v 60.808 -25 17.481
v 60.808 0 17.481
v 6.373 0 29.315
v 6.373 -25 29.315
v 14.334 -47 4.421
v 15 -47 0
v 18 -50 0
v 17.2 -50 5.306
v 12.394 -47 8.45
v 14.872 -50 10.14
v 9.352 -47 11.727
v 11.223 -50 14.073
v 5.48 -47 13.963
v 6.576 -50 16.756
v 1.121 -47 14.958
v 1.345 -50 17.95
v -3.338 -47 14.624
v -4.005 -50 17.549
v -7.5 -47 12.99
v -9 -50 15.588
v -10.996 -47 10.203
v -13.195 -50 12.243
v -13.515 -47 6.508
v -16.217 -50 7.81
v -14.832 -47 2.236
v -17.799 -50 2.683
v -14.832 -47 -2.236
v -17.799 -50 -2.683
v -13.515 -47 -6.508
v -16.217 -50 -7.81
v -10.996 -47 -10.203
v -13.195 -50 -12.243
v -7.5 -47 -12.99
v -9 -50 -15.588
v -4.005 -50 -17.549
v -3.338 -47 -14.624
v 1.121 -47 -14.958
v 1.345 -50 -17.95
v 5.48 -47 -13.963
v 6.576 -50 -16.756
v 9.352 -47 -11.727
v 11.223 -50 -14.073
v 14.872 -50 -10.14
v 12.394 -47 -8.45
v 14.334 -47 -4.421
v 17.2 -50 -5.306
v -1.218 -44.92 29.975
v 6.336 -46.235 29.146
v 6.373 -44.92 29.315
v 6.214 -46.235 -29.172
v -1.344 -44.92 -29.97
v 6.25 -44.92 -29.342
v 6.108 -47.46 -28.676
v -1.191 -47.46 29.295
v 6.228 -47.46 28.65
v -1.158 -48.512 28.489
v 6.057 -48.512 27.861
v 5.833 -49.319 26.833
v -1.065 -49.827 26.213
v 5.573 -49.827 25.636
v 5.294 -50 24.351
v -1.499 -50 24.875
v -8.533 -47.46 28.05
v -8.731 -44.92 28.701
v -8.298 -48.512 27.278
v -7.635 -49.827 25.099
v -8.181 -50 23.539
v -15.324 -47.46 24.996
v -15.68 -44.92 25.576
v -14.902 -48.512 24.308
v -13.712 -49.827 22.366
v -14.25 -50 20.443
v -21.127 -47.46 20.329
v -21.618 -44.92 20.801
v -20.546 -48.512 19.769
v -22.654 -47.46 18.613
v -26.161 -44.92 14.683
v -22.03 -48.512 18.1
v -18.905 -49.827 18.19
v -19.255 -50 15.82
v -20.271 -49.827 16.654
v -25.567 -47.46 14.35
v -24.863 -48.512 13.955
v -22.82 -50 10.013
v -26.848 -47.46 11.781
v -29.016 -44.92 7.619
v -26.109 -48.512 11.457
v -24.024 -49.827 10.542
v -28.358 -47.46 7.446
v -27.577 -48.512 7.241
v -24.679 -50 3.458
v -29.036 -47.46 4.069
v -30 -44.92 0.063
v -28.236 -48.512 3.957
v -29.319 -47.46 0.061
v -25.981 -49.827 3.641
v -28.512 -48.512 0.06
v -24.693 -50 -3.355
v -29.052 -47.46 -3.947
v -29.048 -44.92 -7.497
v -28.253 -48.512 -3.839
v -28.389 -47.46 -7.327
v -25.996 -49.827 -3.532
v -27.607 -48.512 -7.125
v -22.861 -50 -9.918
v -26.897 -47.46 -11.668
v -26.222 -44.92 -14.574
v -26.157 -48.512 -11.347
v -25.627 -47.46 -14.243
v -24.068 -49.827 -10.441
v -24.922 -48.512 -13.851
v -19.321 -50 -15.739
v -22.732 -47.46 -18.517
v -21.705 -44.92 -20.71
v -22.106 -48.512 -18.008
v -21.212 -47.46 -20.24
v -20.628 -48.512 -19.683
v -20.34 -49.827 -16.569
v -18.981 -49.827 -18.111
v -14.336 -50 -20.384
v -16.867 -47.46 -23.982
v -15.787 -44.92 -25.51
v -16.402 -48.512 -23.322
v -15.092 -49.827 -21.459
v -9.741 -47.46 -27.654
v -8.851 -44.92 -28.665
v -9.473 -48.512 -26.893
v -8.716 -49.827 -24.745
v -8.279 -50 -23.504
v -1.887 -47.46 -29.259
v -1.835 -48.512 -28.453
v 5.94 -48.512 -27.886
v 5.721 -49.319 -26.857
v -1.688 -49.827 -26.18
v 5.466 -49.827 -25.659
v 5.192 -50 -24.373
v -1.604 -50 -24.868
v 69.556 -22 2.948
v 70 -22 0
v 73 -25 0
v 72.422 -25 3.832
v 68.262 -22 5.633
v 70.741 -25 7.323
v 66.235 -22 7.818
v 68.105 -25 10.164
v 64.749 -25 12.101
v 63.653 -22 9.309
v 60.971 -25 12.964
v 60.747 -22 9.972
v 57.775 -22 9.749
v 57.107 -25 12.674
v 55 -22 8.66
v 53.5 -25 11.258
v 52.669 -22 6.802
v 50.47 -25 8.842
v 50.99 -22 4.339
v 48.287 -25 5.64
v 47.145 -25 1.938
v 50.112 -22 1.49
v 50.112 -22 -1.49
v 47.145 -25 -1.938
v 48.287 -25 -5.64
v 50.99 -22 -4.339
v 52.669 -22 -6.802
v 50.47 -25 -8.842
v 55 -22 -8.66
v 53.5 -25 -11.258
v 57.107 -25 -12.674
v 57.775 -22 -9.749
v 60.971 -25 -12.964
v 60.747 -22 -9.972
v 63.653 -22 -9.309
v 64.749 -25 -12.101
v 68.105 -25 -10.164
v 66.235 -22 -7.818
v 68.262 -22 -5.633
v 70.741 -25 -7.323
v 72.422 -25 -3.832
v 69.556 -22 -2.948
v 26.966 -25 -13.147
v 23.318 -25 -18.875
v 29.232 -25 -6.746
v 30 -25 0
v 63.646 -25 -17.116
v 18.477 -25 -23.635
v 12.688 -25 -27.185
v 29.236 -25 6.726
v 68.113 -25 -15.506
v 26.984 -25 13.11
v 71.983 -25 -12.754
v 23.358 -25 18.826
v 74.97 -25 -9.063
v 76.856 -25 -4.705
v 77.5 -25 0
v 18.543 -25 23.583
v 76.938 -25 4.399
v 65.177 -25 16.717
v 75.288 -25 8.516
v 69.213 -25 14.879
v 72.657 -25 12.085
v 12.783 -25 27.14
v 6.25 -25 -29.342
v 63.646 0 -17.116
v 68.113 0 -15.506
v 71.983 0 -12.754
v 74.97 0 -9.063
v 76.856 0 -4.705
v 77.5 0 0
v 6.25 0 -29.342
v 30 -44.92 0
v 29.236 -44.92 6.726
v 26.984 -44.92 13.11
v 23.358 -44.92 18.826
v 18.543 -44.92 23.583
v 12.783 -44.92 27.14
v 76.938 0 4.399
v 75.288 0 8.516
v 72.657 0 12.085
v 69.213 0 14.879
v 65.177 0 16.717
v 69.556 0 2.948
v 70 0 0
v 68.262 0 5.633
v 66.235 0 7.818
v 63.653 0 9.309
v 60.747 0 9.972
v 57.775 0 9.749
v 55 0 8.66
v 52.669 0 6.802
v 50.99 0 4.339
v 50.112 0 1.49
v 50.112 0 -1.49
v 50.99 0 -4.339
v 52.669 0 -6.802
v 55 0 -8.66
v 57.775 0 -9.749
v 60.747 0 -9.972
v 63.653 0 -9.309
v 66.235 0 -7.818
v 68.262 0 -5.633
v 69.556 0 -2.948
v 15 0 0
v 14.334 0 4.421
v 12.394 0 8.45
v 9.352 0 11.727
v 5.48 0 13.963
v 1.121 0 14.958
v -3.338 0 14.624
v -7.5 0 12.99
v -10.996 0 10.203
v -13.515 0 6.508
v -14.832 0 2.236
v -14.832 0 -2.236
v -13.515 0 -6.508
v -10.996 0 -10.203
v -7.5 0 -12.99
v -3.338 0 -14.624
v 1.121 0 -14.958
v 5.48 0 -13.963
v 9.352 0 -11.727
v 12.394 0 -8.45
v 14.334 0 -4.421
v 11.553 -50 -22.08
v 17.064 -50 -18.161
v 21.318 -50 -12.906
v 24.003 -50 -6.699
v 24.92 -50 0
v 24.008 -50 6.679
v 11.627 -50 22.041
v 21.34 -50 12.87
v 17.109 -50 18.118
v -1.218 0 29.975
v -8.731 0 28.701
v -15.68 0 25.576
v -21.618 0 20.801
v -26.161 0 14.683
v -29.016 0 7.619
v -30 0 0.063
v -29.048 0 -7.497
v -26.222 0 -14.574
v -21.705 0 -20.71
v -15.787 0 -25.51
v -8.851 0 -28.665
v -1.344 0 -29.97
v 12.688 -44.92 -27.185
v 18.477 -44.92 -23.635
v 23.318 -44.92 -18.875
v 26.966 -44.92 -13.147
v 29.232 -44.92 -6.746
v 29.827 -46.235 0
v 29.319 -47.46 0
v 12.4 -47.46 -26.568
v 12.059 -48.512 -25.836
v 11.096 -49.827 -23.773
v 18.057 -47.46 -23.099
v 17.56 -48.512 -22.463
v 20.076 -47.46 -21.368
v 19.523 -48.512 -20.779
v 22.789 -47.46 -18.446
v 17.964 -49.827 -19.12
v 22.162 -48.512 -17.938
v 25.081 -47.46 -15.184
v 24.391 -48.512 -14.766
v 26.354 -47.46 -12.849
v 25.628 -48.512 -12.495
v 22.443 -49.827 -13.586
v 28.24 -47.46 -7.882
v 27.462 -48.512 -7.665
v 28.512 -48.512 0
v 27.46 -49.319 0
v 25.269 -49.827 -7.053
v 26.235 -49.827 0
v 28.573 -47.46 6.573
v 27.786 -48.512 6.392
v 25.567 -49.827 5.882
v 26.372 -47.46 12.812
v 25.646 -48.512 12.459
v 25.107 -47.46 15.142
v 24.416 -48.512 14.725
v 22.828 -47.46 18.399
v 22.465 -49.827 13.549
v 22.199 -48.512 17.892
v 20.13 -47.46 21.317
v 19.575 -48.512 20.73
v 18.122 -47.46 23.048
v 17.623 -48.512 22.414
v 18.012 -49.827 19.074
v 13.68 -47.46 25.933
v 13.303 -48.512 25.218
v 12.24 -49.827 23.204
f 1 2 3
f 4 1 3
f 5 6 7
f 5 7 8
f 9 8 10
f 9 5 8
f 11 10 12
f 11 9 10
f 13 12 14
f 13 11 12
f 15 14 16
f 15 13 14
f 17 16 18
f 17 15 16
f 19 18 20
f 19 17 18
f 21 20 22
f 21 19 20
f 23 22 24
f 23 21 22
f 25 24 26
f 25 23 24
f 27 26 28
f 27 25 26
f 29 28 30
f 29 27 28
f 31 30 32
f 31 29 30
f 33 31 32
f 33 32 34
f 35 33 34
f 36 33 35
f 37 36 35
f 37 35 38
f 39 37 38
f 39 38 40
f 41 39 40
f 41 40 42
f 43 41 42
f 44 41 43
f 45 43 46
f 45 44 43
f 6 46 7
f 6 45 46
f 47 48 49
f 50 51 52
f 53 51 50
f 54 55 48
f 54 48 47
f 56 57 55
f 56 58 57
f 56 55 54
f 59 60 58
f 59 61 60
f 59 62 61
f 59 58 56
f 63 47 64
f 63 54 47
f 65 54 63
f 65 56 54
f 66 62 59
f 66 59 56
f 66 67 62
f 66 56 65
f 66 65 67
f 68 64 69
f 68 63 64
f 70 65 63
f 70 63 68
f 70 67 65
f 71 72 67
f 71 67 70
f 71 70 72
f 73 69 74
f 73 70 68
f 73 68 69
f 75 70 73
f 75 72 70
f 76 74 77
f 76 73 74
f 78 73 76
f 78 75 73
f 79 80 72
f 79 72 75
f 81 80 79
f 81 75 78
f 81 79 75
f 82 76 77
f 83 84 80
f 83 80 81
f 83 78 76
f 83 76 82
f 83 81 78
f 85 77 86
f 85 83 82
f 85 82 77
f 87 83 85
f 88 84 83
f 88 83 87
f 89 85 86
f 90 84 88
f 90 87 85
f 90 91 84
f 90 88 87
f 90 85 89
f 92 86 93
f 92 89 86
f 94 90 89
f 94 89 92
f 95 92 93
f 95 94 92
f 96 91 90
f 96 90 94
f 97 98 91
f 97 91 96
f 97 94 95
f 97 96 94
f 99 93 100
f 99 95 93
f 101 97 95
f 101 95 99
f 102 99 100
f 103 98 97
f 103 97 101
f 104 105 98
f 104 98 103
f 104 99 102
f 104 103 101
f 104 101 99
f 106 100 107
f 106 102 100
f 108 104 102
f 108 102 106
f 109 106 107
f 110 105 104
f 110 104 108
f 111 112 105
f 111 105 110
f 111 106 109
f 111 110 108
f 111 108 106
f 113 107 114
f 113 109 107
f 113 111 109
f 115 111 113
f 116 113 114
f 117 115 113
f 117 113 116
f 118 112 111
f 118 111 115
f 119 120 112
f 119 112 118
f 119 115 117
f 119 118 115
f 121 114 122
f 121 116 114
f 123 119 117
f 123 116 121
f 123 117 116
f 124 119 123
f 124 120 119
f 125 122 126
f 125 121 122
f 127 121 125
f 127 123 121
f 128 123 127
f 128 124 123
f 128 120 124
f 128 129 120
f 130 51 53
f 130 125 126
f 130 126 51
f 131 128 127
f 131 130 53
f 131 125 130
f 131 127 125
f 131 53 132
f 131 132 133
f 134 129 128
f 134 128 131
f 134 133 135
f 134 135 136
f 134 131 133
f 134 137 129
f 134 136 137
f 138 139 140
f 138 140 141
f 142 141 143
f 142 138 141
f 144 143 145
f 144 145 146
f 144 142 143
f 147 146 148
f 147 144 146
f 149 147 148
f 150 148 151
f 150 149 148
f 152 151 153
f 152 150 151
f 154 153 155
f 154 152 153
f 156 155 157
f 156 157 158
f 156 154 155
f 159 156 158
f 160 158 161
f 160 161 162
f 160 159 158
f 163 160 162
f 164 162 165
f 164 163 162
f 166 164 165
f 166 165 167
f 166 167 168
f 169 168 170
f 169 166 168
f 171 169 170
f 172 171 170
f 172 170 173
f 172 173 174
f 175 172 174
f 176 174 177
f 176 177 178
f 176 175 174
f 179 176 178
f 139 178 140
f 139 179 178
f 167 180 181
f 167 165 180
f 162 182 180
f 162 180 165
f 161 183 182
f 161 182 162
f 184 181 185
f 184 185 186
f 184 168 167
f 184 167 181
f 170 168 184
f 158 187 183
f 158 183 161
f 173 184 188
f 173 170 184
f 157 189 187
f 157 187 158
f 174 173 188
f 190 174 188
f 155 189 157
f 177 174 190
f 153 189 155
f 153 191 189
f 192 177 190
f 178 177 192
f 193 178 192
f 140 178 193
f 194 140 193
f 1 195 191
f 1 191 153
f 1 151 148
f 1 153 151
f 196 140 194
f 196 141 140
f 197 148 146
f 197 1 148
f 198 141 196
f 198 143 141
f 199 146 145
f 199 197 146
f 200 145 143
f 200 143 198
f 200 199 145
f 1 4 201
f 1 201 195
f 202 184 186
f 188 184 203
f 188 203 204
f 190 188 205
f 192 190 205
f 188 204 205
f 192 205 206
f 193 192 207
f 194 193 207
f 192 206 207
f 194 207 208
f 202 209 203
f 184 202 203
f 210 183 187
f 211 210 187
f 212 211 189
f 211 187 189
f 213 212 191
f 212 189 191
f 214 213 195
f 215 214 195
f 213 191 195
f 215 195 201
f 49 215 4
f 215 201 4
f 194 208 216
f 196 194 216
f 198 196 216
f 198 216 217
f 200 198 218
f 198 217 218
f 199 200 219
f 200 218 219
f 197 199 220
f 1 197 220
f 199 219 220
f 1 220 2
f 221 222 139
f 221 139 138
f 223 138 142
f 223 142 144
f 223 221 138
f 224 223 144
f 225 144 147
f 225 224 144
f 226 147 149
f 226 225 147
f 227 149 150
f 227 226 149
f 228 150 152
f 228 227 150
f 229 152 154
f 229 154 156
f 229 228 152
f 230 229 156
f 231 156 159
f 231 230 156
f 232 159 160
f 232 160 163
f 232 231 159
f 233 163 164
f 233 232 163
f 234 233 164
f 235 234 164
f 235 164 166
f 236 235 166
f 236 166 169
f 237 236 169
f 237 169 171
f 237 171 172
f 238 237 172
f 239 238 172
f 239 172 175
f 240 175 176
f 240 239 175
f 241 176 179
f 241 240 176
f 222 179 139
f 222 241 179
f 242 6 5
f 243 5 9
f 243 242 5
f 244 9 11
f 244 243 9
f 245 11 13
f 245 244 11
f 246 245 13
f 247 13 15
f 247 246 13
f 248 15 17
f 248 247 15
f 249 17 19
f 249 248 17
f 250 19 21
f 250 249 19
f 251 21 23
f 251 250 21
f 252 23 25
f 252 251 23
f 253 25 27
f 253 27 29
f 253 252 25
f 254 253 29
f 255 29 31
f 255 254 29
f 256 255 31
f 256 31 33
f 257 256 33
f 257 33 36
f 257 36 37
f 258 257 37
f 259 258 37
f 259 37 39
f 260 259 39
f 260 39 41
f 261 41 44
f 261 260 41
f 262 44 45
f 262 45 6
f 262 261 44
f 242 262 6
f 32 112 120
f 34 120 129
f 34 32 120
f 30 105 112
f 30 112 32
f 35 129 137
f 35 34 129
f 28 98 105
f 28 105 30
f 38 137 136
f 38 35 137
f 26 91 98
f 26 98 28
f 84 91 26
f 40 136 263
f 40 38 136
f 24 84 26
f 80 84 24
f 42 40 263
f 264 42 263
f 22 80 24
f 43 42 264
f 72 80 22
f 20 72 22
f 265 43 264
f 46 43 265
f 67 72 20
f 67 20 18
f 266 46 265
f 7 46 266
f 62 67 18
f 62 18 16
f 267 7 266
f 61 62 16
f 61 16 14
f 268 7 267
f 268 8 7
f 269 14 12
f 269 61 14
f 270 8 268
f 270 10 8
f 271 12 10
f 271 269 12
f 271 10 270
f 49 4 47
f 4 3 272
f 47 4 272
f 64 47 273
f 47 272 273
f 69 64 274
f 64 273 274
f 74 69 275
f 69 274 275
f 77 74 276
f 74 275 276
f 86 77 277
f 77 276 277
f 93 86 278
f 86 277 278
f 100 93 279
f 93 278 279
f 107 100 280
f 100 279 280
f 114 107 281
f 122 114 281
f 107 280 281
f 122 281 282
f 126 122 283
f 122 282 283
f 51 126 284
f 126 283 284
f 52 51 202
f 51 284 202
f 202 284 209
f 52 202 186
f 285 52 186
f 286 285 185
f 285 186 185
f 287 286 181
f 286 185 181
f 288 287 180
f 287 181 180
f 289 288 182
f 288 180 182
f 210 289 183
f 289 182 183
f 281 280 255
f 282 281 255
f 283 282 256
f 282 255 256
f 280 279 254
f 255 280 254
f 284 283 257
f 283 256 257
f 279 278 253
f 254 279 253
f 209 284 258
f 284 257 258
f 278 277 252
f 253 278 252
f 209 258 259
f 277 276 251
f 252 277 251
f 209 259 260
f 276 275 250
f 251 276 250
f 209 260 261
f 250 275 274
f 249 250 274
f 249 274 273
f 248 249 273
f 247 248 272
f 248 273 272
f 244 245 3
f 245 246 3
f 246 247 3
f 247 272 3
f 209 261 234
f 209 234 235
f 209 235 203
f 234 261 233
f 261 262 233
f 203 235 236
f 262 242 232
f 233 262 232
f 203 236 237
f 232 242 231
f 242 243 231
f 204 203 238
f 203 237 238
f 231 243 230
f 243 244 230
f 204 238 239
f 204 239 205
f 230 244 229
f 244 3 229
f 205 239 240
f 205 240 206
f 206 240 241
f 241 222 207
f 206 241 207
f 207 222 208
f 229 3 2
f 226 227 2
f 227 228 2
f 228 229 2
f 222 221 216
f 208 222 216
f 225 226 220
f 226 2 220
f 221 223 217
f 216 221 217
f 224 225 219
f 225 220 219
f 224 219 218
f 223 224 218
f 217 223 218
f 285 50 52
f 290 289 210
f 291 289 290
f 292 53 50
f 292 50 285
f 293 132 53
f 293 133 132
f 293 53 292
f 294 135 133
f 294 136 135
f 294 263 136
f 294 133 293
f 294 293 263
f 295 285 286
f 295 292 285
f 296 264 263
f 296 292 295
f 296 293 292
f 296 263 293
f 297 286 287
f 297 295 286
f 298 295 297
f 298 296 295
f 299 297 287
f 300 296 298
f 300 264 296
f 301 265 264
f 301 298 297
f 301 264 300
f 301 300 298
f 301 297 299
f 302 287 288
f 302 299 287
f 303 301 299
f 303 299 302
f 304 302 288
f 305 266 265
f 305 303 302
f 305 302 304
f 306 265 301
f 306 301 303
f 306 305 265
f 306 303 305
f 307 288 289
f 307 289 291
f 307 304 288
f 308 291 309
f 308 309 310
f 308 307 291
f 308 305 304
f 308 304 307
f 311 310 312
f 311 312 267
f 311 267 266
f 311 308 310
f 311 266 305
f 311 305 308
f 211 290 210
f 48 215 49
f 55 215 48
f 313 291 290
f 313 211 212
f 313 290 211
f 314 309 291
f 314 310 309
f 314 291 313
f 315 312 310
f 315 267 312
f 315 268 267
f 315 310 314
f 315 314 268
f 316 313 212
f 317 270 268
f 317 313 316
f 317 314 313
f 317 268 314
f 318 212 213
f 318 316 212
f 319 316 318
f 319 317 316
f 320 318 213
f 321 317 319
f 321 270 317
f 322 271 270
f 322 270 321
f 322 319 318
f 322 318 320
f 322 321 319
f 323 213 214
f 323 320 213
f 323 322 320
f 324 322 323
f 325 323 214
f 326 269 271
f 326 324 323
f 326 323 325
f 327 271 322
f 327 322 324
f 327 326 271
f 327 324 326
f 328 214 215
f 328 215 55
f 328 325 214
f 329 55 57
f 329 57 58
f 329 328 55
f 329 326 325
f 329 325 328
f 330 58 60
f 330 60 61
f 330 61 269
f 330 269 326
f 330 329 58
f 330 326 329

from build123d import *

# Parameters (mm, degrees)
F0_R     = 15
F0_R_2   = 10
F1_DEPTH = 25
F2_DEPTH = 50
F3_R     = 5.08
F4_SIZE  = 3


with BuildPart() as f1:
    # F0 (on Front) → F1 (new body)
    with BuildSketch(Plane.XZ):
        with BuildLine():
            ThreePointArc((6.25, -29.341736), (23.318448, -18.874586), (30, 0))
            ThreePointArc((30, 0), (23.357967, 18.825657), (6.372975, 29.315272))
            ThreePointArc((6.372975, 29.315272), (-29.999934, 0.062895), (6.25, -29.341736))
        make_face()
        Circle(F0_R, mode=Mode.SUBTRACT)
        with BuildLine():
            ThreePointArc((6.372975, 29.315272), (23.357967, 18.825657), (30, 0))
            ThreePointArc((30, 0), (23.318448, -18.874586), (6.25, -29.341736))
            Line((6.25, -29.341736), (63.645833, -17.116013))
            ThreePointArc((63.645833, -17.116013), (42.558559, -1.430429), (60.808394, 17.481319))
            Line((60.808394, 17.481319), (6.372975, 29.315272))
        make_face()
        with BuildLine():
            ThreePointArc((77.5, 0), (72.656953, 12.085179), (60.808394, 17.481319))
            ThreePointArc((60.808394, 17.481319), (42.558559, -1.430429), (63.645833, -17.116013))
            ThreePointArc((63.645833, -17.116013), (73.602428, -11.010175), (77.5, 0))
        make_face()
        with Locations((60, 0)):
            Circle(F0_R_2, mode=Mode.SUBTRACT)
    extrude(amount=F1_DEPTH)

    # F0 (on Front) → F2 (join)
    with BuildSketch(Plane.XZ):
        with BuildLine():
            ThreePointArc((6.25, -29.341736), (23.318448, -18.874586), (30, 0))
            ThreePointArc((30, 0), (23.357967, 18.825657), (6.372975, 29.315272))
            ThreePointArc((6.372975, 29.315272), (-29.999934, 0.062895), (6.25, -29.341736))
        make_face()
        Circle(F0_R, mode=Mode.SUBTRACT)
    extrude(amount=F2_DEPTH)

    # F3
    f3_edges = [f1.edges().sort_by_distance(p)[0] for p in [
        (-6.25, -50, 29.341736),
    ]]
    fillet(f3_edges, radius=F3_R)

    # F4
    f4_edges = [f1.edges().sort_by_distance(p)[0] for p in [
        (-15, -50, 0),
        (50, -25, 0),
    ]]
    chamfer(f4_edges, length=F4_SIZE)


solid = f1.part
